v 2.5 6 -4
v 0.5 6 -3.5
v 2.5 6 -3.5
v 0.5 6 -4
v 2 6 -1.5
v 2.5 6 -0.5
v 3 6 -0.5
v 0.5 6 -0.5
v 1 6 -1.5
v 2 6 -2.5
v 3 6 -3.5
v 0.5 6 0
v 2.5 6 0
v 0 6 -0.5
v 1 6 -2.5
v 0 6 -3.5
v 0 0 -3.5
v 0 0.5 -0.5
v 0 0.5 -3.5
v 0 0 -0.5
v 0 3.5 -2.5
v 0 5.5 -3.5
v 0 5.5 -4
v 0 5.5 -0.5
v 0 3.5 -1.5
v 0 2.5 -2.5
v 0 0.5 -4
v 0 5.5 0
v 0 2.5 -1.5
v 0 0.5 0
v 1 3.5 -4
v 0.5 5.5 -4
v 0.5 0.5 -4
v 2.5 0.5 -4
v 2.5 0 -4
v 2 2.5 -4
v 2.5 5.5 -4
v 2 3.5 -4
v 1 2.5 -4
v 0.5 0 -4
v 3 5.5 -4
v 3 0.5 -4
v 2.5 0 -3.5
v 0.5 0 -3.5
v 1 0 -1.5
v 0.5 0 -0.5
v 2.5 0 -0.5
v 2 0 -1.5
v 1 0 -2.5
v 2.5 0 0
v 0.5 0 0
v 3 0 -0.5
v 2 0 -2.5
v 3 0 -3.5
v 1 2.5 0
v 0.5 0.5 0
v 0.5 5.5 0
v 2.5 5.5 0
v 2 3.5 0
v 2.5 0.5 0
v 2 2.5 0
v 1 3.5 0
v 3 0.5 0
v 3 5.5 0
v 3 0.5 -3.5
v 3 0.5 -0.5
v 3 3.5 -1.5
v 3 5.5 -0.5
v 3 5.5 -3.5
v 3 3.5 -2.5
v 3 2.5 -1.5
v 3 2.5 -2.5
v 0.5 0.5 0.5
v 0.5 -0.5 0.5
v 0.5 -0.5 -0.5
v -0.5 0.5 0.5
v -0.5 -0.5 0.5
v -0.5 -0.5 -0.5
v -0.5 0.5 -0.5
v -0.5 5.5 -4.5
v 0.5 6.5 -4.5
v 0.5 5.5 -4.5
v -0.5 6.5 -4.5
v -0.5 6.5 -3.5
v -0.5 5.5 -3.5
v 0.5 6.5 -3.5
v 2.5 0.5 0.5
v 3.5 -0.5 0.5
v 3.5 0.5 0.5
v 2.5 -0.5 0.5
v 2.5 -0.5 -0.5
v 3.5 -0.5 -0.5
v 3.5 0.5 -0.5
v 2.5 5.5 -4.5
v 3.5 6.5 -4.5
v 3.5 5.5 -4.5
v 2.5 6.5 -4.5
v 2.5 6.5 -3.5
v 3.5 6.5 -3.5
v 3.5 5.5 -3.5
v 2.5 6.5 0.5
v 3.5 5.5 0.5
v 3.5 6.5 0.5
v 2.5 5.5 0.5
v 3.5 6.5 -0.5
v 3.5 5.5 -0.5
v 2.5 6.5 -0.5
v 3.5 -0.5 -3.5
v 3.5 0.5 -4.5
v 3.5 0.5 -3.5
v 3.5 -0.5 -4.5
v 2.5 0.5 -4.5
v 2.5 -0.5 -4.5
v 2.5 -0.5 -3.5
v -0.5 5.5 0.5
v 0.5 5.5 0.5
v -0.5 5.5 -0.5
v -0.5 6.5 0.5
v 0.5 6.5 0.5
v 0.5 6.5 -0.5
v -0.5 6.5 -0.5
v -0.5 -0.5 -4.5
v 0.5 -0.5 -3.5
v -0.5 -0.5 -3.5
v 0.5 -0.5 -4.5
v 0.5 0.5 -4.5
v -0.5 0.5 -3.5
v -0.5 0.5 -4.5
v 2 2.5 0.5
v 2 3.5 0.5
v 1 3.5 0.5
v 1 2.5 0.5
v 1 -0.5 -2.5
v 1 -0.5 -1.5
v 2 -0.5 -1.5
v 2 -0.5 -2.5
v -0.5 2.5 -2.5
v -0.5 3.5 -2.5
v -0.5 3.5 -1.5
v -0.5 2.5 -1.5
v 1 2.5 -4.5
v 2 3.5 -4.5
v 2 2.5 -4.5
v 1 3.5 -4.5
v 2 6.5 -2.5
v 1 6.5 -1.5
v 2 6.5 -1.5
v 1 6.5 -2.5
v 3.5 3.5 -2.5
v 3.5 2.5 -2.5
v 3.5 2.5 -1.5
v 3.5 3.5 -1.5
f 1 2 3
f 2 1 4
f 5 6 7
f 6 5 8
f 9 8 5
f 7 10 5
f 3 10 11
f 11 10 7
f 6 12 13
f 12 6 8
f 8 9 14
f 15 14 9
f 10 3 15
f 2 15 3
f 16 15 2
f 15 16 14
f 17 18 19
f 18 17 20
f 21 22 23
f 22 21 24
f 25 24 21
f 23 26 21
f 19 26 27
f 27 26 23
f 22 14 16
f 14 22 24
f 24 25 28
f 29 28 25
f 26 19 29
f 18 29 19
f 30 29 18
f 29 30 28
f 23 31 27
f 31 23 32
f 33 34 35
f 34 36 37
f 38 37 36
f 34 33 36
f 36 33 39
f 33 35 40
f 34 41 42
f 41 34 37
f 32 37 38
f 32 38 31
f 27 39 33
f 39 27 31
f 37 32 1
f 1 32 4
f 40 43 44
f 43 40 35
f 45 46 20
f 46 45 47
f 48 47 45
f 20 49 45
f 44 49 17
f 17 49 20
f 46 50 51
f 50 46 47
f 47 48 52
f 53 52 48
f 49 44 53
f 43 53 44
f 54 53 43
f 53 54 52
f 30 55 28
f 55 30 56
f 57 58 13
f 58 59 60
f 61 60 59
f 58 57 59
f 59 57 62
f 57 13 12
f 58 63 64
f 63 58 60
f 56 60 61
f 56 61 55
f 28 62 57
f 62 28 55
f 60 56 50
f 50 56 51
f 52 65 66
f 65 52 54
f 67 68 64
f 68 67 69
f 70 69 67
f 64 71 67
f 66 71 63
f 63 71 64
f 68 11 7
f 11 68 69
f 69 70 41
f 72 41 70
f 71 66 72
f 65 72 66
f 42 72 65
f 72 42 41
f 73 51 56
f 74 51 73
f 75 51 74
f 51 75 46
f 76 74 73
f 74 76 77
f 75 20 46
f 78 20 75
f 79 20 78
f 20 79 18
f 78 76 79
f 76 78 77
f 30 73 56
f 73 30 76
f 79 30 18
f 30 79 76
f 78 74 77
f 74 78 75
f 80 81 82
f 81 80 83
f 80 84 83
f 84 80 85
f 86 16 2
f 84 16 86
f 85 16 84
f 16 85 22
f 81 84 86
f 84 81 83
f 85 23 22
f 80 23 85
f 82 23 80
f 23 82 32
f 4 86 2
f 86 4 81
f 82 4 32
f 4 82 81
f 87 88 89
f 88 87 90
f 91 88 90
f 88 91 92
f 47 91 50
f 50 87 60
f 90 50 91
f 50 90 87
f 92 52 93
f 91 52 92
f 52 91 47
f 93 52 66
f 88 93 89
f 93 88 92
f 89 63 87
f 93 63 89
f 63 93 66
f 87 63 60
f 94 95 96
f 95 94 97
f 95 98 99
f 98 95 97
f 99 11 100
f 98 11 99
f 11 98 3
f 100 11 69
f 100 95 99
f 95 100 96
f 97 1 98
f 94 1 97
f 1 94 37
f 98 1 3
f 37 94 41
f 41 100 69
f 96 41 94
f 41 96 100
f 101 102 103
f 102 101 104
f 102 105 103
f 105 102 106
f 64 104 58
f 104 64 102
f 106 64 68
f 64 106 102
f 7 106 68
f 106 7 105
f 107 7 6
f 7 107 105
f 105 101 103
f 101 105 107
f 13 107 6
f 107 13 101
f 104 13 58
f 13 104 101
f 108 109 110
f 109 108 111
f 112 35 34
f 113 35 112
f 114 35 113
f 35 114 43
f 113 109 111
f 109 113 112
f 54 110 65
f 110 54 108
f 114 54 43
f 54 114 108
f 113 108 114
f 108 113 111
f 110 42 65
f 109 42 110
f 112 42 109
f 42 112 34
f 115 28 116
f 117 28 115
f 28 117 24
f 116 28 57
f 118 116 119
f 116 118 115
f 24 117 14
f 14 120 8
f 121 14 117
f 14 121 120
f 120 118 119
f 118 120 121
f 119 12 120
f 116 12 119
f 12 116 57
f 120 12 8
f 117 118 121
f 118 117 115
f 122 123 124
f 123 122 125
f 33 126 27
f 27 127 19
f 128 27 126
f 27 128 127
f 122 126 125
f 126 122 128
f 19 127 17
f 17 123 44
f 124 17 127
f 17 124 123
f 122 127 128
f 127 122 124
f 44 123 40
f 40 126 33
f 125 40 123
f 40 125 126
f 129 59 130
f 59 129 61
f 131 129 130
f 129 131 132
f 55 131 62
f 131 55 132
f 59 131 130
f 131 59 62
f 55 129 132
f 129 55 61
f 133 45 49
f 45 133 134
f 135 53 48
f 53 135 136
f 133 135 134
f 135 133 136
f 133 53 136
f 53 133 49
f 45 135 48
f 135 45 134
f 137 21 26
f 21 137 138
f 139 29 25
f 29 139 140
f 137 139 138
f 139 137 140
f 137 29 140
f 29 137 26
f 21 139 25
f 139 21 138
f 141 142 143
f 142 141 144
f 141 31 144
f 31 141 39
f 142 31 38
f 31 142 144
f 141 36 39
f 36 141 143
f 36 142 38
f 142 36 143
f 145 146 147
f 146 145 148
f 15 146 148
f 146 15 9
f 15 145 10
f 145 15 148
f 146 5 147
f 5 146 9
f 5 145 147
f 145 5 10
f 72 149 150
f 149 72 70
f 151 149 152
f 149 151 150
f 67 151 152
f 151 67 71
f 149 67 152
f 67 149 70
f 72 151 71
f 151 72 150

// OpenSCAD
// Start: lazy_union
default_5_default_5();
// End: lazy_union

// Modules.

// 'PartMaterial undef-default - undef-default'
module default_5_default_5() {
  // 'None : _combine_solids_and_holes'
  union() {
    // 'block'
    multmatrix(m=[[1.0, 0.0, 0.0, 0.0], [0.0, 0.0, 1.0, 0.0], [-0.0, -1.0, -0.0, -0.0], [0.0, 0.0, 0.0, 1.0]]) {
      // 'block : _combine_solids_and_holes'
      union() {
        // 'block'
        cube(size=[3.0, 4.0, 6.0]);
      }
    }
    // 'corner_0'
    multmatrix(m=[[1.0, 0.0, 0.0, -0.5], [0.0, 1.0, 0.0, -0.5], [0.0, 0.0, 1.0, -0.5], [0.0, 0.0, 0.0, 1.0]]) {
      // 'corner_0'
      color(c=[1.0, 0.0, 0.0, 1.0]) {
        // 'corner_0 : _combine_solids_and_holes'
        union() {
          // 'corner_0'
          cube(size=[1.0, 1.0, 1.0]);
        }
      }
    }
    // 'corner_4'
    multmatrix(m=[[1.0, 0.0, 0.0, -0.5], [0.0, -1.0, 0.0, 6.5], [0.0, 0.0, -1.0, -3.5], [0.0, 0.0, 0.0, 1.0]]) {
      // 'corner_4'
      color(c=[1.0, 1.0, 0.0, 1.0]) {
        // 'corner_4 : _combine_solids_and_holes'
        union() {
          // 'corner_4'
          cube(size=[1.0, 1.0, 1.0]);
        }
      }
    }
    // 'corner_1'
    multmatrix(m=[[0.0, -1.0, 0.0, 3.5], [1.0, 0.0, 0.0, -0.5], [0.0, 0.0, 1.0, -0.5], [0.0, 0.0, 0.0, 1.0]]) {
      // 'corner_1'
      color(c=[0.0, 1.0, 0.0, 1.0]) {
        // 'corner_1 : _combine_solids_and_holes'
        union() {
          // 'corner_1'
          cube(size=[1.0, 1.0, 1.0]);
        }
      }
    }
    // 'corner_5'
    multmatrix(m=[[0.0, -1.0, 0.0, 3.5], [-1.0, 0.0, 0.0, 6.5], [0.0, 0.0, -1.0, -3.5], [0.0, 0.0, 0.0, 1.0]]) {
      // 'corner_5'
      color(c=[1.0, 0.0, 1.0, 1.0]) {
        // 'corner_5 : _combine_solids_and_holes'
        union() {
          // 'corner_5'
          cube(size=[1.0, 1.0, 1.0]);
        }
      }
    }
    // 'corner_2'
    multmatrix(m=[[-1.0, 0.0, 0.0, 3.5], [0.0, -1.0, 0.0, 6.5], [0.0, 0.0, 1.0, -0.5], [0.0, 0.0, 0.0, 1.0]]) {
      // 'corner_2'
      color(c=[0.0, 0.0, 1.0, 1.0]) {
        // 'corner_2 : _combine_solids_and_holes'
        union() {
          // 'corner_2'
          cube(size=[1.0, 1.0, 1.0]);
        }
      }
    }
    // 'corner_6'
    multmatrix(m=[[-1.0, 0.0, 0.0, 3.5], [0.0, 1.0, 0.0, -0.5], [0.0, 0.0, -1.0, -3.5], [0.0, 0.0, 0.0, 1.0]]) {
      // 'corner_6'
      color(c=[0.0, 1.0, 1.0, 1.0]) {
        // 'corner_6 : _combine_solids_and_holes'
        union() {
          // 'corner_6'
          cube(size=[1.0, 1.0, 1.0]);
        }
      }
    }
    // 'corner_3'
    multmatrix(m=[[0.0, 1.0, 0.0, -0.5], [-1.0, 0.0, 0.0, 6.5], [0.0, 0.0, 1.0, -0.5], [0.0, 0.0, 0.0, 1.0]]) {
      // 'corner_3'
      color(c=[1.0, 1.0, 0.0, 1.0]) {
        // 'corner_3 : _combine_solids_and_holes'
        union() {
          // 'corner_3'
          cube(size=[1.0, 1.0, 1.0]);
        }
      }
    }
    // 'corner_7'
    multmatrix(m=[[0.0, 1.0, 0.0, -0.5], [1.0, 0.0, 0.0, -0.5], [0.0, 0.0, -1.0, -3.5], [0.0, 0.0, 0.0, 1.0]]) {
      // 'corner_7'
      color(c=[1.0, 0.0, 0.0, 1.0]) {
        // 'corner_7 : _combine_solids_and_holes'
        union() {
          // 'corner_7'
          cube(size=[1.0, 1.0, 1.0]);
        }
      }
    }
    // 'face_0'
    multmatrix(m=[[1.0, 0.0, 0.0, 1.0], [0.0, 1.0, 0.0, 2.5], [0.0, 0.0, 1.0, -0.5], [0.0, 0.0, 0.0, 1.0]]) {
      // 'face_0'
      color(c=[1.0, 0.0, 1.0, 1.0]) {
        // 'face_0 : _combine_solids_and_holes'
        union() {
          // 'face_0'
          cube(size=[1.0, 1.0, 1.0]);
        }
      }
    }
    // 'face_1'
    multmatrix(m=[[1.0, 0.0, 0.0, 1.0], [0.0, 0.0, -1.0, 0.5], [0.0, 1.0, 0.0, -2.5], [0.0, 0.0, 0.0, 1.0]]) {
      // 'face_1'
      color(c=[1.0, 1.0, 0.0, 1.0]) {
        // 'face_1 : _combine_solids_and_holes'
        union() {
          // 'face_1'
          cube(size=[1.0, 1.0, 1.0]);
        }
      }
    }
    // 'face_2'
    multmatrix(m=[[0.0, 0.0, -1.0, 0.5], [0.0, 1.0, 0.0, 2.5], [1.0, 0.0, 0.0, -2.5], [0.0, 0.0, 0.0, 1.0]]) {
      // 'face_2'
      color(c=[0.0, 0.0, 1.0, 1.0]) {
        // 'face_2 : _combine_solids_and_holes'
        union() {
          // 'face_2'
          cube(size=[1.0, 1.0, 1.0]);
        }
      }
    }
    // 'face_3'
    multmatrix(m=[[1.0, 0.0, 0.0, 1.0], [0.0, -1.0, 0.0, 3.5], [0.0, 0.0, -1.0, -3.5], [0.0, 0.0, 0.0, 1.0]]) {
      // 'face_3'
      color(c=[0.0, 1.0, 0.0, 1.0]) {
        // 'face_3 : _combine_solids_and_holes'
        union() {
          // 'face_3'
          cube(size=[1.0, 1.0, 1.0]);
        }
      }
    }
    // 'face_4'
    multmatrix(m=[[1.0, 0.0, 0.0, 1.0], [0.0, 0.0, 1.0, 5.5], [0.0, -1.0, 0.0, -1.5], [0.0, 0.0, 0.0, 1.0]]) {
      // 'face_4'
      color(c=[1.0, 0.0, 0.0, 1.0]) {
        // 'face_4 : _combine_solids_and_holes'
        union() {
          // 'face_4'
          cube(size=[1.0, 1.0, 1.0]);
        }
      }
    }
    // 'face_5'
    multmatrix(m=[[0.0, 0.0, 1.0, 2.5], [0.0, 1.0, 0.0, 2.5], [-1.0, 0.0, 0.0, -1.5], [0.0, 0.0, 0.0, 1.0]]) {
      // 'face_5'
      color(c=[0.0, 1.0, 1.0, 1.0]) {
        // 'face_5 : _combine_solids_and_holes'
        union() {
          // 'face_5'
          cube(size=[1.0, 1.0, 1.0]);
        }
      }
    }
  }
} // end module default_5_default_5
